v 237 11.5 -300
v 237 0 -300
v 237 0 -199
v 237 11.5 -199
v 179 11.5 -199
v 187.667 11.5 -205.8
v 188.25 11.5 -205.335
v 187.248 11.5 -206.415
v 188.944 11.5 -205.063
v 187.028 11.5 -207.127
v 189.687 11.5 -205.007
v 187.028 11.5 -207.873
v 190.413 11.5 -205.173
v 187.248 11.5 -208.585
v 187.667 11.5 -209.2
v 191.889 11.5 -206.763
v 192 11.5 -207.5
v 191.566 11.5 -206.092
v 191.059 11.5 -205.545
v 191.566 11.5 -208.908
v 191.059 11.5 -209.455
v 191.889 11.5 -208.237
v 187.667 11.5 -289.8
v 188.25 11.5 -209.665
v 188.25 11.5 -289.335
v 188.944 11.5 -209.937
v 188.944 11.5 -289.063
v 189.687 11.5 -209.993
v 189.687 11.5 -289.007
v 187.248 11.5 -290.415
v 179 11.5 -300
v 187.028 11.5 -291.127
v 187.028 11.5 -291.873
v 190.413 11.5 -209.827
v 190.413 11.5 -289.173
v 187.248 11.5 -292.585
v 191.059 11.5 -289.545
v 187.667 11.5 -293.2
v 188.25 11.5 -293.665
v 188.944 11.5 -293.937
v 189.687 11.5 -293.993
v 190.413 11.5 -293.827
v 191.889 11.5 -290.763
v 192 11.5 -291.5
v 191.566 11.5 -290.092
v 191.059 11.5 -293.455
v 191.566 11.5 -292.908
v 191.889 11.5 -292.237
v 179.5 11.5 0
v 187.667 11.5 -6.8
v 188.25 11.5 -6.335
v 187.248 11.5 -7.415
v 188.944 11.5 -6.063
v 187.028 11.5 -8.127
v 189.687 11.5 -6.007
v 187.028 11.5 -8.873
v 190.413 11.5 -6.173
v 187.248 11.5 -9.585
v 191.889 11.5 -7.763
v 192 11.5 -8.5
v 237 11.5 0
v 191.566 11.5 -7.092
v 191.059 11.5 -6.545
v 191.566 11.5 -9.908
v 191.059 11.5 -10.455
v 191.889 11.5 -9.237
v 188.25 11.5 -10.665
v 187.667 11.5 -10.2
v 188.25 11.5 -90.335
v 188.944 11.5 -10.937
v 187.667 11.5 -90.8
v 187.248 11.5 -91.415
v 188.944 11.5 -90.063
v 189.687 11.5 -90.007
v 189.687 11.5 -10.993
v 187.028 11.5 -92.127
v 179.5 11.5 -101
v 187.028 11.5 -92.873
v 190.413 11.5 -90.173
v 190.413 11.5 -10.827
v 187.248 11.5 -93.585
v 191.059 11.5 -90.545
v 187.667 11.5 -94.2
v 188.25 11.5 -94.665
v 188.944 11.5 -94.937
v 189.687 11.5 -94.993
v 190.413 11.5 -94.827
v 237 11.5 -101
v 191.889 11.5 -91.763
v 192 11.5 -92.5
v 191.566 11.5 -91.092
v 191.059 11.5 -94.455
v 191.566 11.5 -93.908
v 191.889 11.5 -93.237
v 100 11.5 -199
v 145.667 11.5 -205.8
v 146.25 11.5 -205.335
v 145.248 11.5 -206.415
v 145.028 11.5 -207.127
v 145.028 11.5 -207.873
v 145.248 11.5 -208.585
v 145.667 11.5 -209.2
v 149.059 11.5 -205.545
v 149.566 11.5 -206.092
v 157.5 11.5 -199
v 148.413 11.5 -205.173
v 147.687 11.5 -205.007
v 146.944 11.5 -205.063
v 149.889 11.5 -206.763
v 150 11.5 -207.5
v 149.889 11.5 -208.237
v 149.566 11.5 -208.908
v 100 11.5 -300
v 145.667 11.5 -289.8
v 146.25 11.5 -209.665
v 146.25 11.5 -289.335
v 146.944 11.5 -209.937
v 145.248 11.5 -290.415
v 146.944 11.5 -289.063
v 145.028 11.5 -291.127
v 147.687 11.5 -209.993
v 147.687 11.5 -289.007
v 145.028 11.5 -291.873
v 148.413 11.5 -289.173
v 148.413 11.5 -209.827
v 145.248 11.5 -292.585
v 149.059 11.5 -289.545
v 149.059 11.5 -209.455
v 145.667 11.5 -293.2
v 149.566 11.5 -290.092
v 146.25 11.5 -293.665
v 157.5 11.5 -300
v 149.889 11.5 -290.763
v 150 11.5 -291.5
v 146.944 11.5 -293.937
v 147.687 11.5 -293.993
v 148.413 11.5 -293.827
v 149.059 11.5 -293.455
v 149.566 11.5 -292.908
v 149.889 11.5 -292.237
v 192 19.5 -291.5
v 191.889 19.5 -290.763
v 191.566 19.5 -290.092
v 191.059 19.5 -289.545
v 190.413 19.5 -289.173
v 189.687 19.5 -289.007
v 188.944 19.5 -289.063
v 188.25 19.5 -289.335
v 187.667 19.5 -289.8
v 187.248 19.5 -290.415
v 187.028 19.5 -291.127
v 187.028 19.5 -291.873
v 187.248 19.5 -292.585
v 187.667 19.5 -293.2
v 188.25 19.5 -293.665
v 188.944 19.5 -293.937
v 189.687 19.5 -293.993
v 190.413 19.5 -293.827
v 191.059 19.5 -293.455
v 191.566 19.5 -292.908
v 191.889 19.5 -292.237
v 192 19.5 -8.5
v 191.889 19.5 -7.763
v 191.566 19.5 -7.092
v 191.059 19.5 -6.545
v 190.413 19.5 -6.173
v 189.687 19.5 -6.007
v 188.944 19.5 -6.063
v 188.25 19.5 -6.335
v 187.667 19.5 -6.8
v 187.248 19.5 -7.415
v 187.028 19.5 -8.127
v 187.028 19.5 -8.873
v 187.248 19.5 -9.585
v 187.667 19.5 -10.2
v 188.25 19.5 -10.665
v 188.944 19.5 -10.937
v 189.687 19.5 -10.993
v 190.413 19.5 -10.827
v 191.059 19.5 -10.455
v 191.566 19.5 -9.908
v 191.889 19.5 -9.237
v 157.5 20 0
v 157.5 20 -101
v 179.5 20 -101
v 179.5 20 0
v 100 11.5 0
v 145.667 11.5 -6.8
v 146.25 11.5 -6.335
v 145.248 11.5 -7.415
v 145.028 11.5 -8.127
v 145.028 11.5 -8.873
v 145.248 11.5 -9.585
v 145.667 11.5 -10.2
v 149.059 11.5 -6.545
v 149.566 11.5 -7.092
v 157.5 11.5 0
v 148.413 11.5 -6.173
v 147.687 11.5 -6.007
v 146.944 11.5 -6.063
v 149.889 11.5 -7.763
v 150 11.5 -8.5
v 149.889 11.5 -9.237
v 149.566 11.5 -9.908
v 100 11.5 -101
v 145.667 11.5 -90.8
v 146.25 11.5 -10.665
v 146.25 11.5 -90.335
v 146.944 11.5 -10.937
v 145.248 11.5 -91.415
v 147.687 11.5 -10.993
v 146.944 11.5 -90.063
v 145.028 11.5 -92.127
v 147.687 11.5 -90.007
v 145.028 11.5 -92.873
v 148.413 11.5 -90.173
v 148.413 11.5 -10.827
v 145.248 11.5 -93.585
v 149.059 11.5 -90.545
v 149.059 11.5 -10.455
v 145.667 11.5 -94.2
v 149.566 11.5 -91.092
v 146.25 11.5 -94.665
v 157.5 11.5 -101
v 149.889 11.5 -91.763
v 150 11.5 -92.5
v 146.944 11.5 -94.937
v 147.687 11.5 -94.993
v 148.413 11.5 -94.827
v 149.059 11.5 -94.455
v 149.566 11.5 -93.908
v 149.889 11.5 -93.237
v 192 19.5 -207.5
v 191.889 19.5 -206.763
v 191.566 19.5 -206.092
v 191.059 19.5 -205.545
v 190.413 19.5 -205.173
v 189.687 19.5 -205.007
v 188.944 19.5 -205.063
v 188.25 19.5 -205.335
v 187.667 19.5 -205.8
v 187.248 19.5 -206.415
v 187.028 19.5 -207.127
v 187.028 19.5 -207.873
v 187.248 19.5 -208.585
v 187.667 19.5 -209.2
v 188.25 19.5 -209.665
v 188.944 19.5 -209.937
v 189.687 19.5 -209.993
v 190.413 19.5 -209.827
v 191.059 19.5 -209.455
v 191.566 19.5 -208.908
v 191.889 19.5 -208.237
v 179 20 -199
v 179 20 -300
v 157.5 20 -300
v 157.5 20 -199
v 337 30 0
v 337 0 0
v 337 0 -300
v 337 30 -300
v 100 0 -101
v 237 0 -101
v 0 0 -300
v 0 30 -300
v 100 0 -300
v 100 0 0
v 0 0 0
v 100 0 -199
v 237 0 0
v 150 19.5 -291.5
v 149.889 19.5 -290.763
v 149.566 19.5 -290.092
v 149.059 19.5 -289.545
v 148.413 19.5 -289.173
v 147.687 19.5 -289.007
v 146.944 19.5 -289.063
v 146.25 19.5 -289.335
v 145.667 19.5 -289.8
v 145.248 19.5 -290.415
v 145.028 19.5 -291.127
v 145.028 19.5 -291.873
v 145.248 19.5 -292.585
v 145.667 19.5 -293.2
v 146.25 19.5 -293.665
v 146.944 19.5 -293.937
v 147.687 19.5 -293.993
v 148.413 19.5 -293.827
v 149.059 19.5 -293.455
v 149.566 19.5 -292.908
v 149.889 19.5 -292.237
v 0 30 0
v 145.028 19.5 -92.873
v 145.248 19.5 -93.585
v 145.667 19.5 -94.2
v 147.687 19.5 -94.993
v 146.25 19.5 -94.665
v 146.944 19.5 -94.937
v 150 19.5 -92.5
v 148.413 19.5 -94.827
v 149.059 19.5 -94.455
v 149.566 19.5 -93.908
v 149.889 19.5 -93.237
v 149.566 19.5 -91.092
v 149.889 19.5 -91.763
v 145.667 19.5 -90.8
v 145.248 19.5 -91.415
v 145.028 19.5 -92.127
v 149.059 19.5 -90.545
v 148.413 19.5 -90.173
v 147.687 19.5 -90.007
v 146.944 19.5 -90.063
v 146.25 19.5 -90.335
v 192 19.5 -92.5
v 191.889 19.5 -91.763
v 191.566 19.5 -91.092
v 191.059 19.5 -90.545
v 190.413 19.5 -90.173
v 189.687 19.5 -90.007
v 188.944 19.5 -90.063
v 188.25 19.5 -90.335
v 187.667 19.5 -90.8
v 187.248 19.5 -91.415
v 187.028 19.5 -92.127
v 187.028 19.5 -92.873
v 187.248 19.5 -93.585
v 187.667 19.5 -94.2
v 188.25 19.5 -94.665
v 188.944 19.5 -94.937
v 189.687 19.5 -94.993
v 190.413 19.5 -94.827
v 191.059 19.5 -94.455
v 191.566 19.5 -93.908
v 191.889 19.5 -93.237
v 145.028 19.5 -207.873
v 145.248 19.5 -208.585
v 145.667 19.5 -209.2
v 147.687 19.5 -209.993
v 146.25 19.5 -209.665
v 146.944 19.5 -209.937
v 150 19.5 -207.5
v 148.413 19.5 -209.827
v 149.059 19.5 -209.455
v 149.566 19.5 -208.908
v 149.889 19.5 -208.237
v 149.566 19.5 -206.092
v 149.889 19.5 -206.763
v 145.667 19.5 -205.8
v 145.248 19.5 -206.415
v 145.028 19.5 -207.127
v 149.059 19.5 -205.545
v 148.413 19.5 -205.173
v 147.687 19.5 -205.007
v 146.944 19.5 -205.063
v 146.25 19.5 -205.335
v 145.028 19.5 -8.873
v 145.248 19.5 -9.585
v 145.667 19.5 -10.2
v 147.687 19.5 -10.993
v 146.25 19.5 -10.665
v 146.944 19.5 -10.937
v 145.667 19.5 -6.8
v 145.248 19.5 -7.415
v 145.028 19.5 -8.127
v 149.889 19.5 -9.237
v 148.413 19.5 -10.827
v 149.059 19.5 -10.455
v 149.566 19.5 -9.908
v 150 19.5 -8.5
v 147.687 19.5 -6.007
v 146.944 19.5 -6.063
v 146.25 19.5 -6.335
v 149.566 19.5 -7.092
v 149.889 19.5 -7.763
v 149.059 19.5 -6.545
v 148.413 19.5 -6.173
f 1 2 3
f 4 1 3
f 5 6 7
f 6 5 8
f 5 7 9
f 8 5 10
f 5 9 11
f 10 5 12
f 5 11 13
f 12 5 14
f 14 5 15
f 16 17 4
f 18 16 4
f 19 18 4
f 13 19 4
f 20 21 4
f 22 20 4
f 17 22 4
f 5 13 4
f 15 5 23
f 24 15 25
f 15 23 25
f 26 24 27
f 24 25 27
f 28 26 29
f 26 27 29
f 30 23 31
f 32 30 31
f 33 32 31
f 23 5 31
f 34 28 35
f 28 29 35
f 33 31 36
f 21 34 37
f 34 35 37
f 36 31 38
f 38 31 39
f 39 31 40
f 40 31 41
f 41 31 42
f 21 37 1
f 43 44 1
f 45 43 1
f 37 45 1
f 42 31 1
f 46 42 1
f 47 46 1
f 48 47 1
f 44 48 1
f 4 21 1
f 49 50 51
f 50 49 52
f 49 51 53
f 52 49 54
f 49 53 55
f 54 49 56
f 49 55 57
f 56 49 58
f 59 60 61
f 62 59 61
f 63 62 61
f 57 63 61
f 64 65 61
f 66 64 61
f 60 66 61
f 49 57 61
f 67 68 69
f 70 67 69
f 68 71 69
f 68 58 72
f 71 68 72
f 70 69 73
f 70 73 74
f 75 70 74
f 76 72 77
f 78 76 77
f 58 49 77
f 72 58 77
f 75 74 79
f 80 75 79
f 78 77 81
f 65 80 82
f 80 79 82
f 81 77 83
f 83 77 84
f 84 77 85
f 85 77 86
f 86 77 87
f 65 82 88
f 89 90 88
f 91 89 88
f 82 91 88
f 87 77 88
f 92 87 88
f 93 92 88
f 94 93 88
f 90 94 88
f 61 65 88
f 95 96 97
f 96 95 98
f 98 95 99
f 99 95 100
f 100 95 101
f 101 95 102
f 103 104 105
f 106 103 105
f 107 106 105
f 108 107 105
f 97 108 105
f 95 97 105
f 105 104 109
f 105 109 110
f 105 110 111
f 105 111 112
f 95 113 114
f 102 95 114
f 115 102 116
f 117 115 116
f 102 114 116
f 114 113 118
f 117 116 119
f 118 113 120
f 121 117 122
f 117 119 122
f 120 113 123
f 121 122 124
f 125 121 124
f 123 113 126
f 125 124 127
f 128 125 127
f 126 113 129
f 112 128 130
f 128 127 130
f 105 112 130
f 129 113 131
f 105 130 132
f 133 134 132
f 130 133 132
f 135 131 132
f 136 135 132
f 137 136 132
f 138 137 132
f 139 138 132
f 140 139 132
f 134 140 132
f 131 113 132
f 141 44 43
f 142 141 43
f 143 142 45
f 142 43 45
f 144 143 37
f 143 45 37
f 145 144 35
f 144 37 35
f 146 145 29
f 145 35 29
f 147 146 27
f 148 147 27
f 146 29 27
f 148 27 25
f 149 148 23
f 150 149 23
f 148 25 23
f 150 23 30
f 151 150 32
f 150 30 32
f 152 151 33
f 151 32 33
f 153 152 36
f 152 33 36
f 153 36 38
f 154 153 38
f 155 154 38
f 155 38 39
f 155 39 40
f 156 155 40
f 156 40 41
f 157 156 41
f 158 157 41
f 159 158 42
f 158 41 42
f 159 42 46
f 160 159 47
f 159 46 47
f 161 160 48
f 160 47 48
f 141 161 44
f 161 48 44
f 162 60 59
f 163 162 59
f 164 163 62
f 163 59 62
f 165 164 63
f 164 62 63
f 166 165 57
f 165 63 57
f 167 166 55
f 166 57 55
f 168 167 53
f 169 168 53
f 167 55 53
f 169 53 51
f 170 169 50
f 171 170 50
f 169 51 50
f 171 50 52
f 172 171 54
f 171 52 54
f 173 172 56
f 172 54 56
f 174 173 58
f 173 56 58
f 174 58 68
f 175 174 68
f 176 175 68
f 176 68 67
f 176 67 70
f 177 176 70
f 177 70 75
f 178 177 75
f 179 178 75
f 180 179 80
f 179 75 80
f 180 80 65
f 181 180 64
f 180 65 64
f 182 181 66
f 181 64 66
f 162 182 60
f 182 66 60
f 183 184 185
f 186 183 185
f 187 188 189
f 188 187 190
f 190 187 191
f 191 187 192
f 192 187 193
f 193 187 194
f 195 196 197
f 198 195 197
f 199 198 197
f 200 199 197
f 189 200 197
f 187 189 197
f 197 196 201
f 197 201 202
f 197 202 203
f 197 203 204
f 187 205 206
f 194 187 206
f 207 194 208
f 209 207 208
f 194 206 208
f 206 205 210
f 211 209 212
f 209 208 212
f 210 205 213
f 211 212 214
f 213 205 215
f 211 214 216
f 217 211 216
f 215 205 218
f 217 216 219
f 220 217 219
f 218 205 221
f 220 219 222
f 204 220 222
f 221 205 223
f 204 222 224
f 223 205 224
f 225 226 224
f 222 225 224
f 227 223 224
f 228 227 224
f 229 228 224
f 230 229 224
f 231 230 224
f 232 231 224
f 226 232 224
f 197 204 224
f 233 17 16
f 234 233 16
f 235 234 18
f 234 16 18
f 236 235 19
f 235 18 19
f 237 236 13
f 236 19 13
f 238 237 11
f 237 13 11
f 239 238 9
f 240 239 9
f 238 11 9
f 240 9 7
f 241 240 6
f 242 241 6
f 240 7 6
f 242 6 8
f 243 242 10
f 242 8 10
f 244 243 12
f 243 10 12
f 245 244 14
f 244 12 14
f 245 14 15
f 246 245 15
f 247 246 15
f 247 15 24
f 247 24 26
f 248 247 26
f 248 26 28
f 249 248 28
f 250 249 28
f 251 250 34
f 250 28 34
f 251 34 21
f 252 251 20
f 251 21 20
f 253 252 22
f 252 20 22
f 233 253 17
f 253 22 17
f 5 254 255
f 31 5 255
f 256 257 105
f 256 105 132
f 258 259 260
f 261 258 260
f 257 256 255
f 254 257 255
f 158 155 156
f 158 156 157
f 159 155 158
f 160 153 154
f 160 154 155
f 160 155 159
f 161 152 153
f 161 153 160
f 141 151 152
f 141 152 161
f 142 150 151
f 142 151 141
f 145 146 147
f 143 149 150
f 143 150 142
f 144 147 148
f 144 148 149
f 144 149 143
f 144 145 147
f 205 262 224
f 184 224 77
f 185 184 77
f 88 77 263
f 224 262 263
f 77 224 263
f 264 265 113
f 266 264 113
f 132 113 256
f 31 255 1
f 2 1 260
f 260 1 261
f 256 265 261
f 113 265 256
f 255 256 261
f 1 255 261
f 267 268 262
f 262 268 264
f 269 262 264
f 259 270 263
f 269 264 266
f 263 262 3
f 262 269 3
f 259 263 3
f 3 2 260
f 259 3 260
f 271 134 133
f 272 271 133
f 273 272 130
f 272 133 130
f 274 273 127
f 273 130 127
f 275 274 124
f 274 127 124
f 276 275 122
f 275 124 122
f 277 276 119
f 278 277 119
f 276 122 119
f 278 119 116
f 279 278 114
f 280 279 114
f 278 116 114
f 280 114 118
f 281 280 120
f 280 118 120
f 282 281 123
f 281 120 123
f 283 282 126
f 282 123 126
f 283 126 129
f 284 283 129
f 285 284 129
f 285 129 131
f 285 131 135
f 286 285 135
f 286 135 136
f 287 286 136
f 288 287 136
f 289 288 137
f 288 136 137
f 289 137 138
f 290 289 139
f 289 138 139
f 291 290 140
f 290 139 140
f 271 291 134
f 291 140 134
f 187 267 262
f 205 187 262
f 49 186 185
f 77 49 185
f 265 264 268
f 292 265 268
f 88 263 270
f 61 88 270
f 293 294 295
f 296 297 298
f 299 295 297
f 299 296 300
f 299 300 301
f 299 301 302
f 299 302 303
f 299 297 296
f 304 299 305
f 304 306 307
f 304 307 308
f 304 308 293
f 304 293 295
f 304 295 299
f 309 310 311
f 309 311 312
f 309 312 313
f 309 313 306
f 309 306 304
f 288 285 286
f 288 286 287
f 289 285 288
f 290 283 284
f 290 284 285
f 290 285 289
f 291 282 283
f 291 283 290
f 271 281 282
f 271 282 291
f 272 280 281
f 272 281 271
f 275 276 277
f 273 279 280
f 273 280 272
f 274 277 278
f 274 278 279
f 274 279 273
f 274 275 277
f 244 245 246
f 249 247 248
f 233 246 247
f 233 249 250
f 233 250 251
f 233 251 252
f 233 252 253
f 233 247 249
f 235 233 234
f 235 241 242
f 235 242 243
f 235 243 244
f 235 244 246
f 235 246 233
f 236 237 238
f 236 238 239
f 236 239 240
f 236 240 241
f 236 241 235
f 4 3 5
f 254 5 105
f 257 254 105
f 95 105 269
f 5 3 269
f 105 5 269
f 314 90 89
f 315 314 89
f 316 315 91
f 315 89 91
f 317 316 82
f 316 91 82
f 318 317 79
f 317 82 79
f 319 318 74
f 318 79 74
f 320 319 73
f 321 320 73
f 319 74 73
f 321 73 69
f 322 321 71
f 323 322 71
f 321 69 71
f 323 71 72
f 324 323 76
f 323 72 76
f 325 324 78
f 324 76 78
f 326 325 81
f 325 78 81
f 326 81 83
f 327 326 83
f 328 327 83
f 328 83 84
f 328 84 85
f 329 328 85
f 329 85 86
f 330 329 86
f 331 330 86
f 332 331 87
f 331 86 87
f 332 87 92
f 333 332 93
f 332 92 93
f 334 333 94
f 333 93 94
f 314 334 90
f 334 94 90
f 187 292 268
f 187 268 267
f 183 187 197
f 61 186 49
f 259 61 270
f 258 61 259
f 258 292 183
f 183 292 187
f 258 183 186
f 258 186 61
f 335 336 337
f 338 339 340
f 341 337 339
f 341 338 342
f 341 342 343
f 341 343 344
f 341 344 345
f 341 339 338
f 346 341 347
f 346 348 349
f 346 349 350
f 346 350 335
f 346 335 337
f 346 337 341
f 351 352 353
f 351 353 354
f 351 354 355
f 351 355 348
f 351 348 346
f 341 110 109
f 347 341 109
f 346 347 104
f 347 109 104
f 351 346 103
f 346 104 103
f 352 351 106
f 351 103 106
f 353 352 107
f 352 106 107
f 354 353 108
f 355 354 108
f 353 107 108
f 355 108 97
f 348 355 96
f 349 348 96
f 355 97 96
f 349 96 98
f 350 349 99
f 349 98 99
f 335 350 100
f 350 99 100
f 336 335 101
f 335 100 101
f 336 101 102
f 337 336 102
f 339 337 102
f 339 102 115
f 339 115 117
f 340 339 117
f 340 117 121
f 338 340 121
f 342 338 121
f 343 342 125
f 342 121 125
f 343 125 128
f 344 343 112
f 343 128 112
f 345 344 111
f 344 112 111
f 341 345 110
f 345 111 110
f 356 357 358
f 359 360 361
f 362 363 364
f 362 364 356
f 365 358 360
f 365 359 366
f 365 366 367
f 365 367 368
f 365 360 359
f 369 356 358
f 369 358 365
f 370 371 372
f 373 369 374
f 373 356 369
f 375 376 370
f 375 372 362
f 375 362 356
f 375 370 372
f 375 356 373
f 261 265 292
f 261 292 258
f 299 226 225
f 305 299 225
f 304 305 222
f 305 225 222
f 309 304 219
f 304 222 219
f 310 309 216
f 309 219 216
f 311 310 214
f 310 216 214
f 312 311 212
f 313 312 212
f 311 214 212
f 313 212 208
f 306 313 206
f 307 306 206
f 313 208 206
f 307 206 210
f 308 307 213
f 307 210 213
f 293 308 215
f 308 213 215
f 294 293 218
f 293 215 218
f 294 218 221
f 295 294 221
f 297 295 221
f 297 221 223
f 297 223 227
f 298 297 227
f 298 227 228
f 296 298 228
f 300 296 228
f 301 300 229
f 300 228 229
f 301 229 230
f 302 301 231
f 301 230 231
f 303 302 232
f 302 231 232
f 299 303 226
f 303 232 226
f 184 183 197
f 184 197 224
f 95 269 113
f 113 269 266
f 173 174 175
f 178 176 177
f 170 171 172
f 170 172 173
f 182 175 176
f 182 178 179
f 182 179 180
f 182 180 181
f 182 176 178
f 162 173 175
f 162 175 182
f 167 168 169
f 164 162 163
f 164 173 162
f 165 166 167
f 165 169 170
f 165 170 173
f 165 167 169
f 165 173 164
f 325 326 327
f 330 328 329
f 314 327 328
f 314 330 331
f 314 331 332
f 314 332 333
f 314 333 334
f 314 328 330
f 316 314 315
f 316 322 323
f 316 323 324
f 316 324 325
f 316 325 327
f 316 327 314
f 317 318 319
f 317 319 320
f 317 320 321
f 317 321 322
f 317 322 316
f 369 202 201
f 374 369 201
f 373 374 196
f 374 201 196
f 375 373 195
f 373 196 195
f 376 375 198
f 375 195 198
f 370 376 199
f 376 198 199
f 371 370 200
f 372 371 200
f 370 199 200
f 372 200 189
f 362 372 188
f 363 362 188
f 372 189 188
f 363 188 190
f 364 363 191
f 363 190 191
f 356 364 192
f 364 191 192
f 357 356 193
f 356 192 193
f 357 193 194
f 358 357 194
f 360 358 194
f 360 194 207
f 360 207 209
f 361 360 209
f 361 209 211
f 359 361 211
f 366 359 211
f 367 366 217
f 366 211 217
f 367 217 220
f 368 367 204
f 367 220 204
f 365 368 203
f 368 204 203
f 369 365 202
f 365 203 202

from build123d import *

# Parameters (mm, degrees)
BOSS_EXTRUDE3_DEPTH = 30
SKETCH8_W           = 137
SKETCH8_H           = 101
BOSS_EXTRUDE5_DEPTH = 10
SKETCH9_W           = 57.5
SKETCH9_H           = 101
BOSS_EXTRUDE6_DEPTH = 8.5
SKETCH10_W          = 57.5
SKETCH10_H          = 101
SKETCH10_W_2        = 58
BOSS_EXTRUDE7_DEPTH = 8.5
SKETCH13_R          = 2.5
CUT_EXTRUDE1_DEPTH  = 8
SKETCH14_R          = 2.5
CUT_EXTRUDE2_DEPTH  = 8
SKETCH15_R          = 2.5
CUT_EXTRUDE3_DEPTH  = 8
SKETCH16_R          = 2.5
CUT_EXTRUDE4_DEPTH  = 8


with BuildPart() as part:
    # Sketch5 → Boss-Extrude3 (new body)
    with BuildSketch(Plane(origin=(0, 0, 0), x_dir=(1, 0, 0), z_dir=(0, 1, 0))):
        Polygon((100, 199), (100, 300), (0, 300), (0, 0), (100, 0), (100, 101), (237, 101), (237, 0), (337, 0), (337, 300), (237, 300), (237, 199), align=None)
    extrude(amount=BOSS_EXTRUDE3_DEPTH)

    # Sketch8 → Boss-Extrude5 (add)
    with BuildSketch(Plane(origin=(0, 30, 0), x_dir=(1, 0, 0), z_dir=(0, 1, 0))):
        with Locations((168.5, 249.5)):
            Rectangle(SKETCH8_W, SKETCH8_H)
        with Locations((168.5, 50.5)):
            Rectangle(SKETCH8_W, SKETCH8_H)
    extrude(amount=-BOSS_EXTRUDE5_DEPTH)

    # Sketch9 → Boss-Extrude6 (add)
    with BuildSketch(Plane(origin=(0, 20, 0), x_dir=(1, 0, 0), z_dir=(0, 1, 0))):
        with Locations((128.75, 50.5)):
            Rectangle(SKETCH9_W, SKETCH9_H)
        with Locations((208.25, 50.5)):
            Rectangle(SKETCH9_W, SKETCH9_H)
    extrude(amount=-BOSS_EXTRUDE6_DEPTH)

    # Sketch10 → Boss-Extrude7 (add)
    with BuildSketch(Plane(origin=(0, 20, 0), x_dir=(1, 0, 0), z_dir=(0, 1, 0))):
        with Locations((128.75, 249.5)):
            Rectangle(SKETCH10_W, SKETCH10_H)
        with Locations((208, 249.5)):
            Rectangle(SKETCH10_W_2, SKETCH10_H)
    extrude(amount=-BOSS_EXTRUDE7_DEPTH)

    # Sketch13 → Cut-Extrude1 (cut)
    with BuildSketch(Plane.XZ.offset(-11.5)):
        with Locations((147.5, -8.5)):
            Circle(SKETCH13_R)
        with Locations((147.5, -92.5)):
            Circle(SKETCH13_R)
    extrude(amount=-CUT_EXTRUDE1_DEPTH, mode=Mode.SUBTRACT)

    # Sketch14 → Cut-Extrude2 (cut)
    with BuildSketch(Plane.XZ.offset(-11.5)):
        with Locations((189.5, -8.5)):
            Circle(SKETCH14_R)
        with Locations((189.5, -92.5)):
            Circle(SKETCH14_R)
    extrude(amount=-CUT_EXTRUDE2_DEPTH, mode=Mode.SUBTRACT)

    # Sketch15 → Cut-Extrude3 (cut)
    with BuildSketch(Plane.XZ.offset(-11.5)):
        with Locations((147.5, -207.5)):
            Circle(SKETCH15_R)
        with Locations((147.5, -291.5)):
            Circle(SKETCH15_R)
    extrude(amount=-CUT_EXTRUDE3_DEPTH, mode=Mode.SUBTRACT)

    # Sketch16 → Cut-Extrude4 (cut)
    with BuildSketch(Plane.XZ.offset(-11.5)):
        with Locations((189.5, -207.5)):
            Circle(SKETCH16_R)
        with Locations((189.5, -291.5)):
            Circle(SKETCH16_R)
    extrude(amount=-CUT_EXTRUDE4_DEPTH, mode=Mode.SUBTRACT)


solid = part.part
